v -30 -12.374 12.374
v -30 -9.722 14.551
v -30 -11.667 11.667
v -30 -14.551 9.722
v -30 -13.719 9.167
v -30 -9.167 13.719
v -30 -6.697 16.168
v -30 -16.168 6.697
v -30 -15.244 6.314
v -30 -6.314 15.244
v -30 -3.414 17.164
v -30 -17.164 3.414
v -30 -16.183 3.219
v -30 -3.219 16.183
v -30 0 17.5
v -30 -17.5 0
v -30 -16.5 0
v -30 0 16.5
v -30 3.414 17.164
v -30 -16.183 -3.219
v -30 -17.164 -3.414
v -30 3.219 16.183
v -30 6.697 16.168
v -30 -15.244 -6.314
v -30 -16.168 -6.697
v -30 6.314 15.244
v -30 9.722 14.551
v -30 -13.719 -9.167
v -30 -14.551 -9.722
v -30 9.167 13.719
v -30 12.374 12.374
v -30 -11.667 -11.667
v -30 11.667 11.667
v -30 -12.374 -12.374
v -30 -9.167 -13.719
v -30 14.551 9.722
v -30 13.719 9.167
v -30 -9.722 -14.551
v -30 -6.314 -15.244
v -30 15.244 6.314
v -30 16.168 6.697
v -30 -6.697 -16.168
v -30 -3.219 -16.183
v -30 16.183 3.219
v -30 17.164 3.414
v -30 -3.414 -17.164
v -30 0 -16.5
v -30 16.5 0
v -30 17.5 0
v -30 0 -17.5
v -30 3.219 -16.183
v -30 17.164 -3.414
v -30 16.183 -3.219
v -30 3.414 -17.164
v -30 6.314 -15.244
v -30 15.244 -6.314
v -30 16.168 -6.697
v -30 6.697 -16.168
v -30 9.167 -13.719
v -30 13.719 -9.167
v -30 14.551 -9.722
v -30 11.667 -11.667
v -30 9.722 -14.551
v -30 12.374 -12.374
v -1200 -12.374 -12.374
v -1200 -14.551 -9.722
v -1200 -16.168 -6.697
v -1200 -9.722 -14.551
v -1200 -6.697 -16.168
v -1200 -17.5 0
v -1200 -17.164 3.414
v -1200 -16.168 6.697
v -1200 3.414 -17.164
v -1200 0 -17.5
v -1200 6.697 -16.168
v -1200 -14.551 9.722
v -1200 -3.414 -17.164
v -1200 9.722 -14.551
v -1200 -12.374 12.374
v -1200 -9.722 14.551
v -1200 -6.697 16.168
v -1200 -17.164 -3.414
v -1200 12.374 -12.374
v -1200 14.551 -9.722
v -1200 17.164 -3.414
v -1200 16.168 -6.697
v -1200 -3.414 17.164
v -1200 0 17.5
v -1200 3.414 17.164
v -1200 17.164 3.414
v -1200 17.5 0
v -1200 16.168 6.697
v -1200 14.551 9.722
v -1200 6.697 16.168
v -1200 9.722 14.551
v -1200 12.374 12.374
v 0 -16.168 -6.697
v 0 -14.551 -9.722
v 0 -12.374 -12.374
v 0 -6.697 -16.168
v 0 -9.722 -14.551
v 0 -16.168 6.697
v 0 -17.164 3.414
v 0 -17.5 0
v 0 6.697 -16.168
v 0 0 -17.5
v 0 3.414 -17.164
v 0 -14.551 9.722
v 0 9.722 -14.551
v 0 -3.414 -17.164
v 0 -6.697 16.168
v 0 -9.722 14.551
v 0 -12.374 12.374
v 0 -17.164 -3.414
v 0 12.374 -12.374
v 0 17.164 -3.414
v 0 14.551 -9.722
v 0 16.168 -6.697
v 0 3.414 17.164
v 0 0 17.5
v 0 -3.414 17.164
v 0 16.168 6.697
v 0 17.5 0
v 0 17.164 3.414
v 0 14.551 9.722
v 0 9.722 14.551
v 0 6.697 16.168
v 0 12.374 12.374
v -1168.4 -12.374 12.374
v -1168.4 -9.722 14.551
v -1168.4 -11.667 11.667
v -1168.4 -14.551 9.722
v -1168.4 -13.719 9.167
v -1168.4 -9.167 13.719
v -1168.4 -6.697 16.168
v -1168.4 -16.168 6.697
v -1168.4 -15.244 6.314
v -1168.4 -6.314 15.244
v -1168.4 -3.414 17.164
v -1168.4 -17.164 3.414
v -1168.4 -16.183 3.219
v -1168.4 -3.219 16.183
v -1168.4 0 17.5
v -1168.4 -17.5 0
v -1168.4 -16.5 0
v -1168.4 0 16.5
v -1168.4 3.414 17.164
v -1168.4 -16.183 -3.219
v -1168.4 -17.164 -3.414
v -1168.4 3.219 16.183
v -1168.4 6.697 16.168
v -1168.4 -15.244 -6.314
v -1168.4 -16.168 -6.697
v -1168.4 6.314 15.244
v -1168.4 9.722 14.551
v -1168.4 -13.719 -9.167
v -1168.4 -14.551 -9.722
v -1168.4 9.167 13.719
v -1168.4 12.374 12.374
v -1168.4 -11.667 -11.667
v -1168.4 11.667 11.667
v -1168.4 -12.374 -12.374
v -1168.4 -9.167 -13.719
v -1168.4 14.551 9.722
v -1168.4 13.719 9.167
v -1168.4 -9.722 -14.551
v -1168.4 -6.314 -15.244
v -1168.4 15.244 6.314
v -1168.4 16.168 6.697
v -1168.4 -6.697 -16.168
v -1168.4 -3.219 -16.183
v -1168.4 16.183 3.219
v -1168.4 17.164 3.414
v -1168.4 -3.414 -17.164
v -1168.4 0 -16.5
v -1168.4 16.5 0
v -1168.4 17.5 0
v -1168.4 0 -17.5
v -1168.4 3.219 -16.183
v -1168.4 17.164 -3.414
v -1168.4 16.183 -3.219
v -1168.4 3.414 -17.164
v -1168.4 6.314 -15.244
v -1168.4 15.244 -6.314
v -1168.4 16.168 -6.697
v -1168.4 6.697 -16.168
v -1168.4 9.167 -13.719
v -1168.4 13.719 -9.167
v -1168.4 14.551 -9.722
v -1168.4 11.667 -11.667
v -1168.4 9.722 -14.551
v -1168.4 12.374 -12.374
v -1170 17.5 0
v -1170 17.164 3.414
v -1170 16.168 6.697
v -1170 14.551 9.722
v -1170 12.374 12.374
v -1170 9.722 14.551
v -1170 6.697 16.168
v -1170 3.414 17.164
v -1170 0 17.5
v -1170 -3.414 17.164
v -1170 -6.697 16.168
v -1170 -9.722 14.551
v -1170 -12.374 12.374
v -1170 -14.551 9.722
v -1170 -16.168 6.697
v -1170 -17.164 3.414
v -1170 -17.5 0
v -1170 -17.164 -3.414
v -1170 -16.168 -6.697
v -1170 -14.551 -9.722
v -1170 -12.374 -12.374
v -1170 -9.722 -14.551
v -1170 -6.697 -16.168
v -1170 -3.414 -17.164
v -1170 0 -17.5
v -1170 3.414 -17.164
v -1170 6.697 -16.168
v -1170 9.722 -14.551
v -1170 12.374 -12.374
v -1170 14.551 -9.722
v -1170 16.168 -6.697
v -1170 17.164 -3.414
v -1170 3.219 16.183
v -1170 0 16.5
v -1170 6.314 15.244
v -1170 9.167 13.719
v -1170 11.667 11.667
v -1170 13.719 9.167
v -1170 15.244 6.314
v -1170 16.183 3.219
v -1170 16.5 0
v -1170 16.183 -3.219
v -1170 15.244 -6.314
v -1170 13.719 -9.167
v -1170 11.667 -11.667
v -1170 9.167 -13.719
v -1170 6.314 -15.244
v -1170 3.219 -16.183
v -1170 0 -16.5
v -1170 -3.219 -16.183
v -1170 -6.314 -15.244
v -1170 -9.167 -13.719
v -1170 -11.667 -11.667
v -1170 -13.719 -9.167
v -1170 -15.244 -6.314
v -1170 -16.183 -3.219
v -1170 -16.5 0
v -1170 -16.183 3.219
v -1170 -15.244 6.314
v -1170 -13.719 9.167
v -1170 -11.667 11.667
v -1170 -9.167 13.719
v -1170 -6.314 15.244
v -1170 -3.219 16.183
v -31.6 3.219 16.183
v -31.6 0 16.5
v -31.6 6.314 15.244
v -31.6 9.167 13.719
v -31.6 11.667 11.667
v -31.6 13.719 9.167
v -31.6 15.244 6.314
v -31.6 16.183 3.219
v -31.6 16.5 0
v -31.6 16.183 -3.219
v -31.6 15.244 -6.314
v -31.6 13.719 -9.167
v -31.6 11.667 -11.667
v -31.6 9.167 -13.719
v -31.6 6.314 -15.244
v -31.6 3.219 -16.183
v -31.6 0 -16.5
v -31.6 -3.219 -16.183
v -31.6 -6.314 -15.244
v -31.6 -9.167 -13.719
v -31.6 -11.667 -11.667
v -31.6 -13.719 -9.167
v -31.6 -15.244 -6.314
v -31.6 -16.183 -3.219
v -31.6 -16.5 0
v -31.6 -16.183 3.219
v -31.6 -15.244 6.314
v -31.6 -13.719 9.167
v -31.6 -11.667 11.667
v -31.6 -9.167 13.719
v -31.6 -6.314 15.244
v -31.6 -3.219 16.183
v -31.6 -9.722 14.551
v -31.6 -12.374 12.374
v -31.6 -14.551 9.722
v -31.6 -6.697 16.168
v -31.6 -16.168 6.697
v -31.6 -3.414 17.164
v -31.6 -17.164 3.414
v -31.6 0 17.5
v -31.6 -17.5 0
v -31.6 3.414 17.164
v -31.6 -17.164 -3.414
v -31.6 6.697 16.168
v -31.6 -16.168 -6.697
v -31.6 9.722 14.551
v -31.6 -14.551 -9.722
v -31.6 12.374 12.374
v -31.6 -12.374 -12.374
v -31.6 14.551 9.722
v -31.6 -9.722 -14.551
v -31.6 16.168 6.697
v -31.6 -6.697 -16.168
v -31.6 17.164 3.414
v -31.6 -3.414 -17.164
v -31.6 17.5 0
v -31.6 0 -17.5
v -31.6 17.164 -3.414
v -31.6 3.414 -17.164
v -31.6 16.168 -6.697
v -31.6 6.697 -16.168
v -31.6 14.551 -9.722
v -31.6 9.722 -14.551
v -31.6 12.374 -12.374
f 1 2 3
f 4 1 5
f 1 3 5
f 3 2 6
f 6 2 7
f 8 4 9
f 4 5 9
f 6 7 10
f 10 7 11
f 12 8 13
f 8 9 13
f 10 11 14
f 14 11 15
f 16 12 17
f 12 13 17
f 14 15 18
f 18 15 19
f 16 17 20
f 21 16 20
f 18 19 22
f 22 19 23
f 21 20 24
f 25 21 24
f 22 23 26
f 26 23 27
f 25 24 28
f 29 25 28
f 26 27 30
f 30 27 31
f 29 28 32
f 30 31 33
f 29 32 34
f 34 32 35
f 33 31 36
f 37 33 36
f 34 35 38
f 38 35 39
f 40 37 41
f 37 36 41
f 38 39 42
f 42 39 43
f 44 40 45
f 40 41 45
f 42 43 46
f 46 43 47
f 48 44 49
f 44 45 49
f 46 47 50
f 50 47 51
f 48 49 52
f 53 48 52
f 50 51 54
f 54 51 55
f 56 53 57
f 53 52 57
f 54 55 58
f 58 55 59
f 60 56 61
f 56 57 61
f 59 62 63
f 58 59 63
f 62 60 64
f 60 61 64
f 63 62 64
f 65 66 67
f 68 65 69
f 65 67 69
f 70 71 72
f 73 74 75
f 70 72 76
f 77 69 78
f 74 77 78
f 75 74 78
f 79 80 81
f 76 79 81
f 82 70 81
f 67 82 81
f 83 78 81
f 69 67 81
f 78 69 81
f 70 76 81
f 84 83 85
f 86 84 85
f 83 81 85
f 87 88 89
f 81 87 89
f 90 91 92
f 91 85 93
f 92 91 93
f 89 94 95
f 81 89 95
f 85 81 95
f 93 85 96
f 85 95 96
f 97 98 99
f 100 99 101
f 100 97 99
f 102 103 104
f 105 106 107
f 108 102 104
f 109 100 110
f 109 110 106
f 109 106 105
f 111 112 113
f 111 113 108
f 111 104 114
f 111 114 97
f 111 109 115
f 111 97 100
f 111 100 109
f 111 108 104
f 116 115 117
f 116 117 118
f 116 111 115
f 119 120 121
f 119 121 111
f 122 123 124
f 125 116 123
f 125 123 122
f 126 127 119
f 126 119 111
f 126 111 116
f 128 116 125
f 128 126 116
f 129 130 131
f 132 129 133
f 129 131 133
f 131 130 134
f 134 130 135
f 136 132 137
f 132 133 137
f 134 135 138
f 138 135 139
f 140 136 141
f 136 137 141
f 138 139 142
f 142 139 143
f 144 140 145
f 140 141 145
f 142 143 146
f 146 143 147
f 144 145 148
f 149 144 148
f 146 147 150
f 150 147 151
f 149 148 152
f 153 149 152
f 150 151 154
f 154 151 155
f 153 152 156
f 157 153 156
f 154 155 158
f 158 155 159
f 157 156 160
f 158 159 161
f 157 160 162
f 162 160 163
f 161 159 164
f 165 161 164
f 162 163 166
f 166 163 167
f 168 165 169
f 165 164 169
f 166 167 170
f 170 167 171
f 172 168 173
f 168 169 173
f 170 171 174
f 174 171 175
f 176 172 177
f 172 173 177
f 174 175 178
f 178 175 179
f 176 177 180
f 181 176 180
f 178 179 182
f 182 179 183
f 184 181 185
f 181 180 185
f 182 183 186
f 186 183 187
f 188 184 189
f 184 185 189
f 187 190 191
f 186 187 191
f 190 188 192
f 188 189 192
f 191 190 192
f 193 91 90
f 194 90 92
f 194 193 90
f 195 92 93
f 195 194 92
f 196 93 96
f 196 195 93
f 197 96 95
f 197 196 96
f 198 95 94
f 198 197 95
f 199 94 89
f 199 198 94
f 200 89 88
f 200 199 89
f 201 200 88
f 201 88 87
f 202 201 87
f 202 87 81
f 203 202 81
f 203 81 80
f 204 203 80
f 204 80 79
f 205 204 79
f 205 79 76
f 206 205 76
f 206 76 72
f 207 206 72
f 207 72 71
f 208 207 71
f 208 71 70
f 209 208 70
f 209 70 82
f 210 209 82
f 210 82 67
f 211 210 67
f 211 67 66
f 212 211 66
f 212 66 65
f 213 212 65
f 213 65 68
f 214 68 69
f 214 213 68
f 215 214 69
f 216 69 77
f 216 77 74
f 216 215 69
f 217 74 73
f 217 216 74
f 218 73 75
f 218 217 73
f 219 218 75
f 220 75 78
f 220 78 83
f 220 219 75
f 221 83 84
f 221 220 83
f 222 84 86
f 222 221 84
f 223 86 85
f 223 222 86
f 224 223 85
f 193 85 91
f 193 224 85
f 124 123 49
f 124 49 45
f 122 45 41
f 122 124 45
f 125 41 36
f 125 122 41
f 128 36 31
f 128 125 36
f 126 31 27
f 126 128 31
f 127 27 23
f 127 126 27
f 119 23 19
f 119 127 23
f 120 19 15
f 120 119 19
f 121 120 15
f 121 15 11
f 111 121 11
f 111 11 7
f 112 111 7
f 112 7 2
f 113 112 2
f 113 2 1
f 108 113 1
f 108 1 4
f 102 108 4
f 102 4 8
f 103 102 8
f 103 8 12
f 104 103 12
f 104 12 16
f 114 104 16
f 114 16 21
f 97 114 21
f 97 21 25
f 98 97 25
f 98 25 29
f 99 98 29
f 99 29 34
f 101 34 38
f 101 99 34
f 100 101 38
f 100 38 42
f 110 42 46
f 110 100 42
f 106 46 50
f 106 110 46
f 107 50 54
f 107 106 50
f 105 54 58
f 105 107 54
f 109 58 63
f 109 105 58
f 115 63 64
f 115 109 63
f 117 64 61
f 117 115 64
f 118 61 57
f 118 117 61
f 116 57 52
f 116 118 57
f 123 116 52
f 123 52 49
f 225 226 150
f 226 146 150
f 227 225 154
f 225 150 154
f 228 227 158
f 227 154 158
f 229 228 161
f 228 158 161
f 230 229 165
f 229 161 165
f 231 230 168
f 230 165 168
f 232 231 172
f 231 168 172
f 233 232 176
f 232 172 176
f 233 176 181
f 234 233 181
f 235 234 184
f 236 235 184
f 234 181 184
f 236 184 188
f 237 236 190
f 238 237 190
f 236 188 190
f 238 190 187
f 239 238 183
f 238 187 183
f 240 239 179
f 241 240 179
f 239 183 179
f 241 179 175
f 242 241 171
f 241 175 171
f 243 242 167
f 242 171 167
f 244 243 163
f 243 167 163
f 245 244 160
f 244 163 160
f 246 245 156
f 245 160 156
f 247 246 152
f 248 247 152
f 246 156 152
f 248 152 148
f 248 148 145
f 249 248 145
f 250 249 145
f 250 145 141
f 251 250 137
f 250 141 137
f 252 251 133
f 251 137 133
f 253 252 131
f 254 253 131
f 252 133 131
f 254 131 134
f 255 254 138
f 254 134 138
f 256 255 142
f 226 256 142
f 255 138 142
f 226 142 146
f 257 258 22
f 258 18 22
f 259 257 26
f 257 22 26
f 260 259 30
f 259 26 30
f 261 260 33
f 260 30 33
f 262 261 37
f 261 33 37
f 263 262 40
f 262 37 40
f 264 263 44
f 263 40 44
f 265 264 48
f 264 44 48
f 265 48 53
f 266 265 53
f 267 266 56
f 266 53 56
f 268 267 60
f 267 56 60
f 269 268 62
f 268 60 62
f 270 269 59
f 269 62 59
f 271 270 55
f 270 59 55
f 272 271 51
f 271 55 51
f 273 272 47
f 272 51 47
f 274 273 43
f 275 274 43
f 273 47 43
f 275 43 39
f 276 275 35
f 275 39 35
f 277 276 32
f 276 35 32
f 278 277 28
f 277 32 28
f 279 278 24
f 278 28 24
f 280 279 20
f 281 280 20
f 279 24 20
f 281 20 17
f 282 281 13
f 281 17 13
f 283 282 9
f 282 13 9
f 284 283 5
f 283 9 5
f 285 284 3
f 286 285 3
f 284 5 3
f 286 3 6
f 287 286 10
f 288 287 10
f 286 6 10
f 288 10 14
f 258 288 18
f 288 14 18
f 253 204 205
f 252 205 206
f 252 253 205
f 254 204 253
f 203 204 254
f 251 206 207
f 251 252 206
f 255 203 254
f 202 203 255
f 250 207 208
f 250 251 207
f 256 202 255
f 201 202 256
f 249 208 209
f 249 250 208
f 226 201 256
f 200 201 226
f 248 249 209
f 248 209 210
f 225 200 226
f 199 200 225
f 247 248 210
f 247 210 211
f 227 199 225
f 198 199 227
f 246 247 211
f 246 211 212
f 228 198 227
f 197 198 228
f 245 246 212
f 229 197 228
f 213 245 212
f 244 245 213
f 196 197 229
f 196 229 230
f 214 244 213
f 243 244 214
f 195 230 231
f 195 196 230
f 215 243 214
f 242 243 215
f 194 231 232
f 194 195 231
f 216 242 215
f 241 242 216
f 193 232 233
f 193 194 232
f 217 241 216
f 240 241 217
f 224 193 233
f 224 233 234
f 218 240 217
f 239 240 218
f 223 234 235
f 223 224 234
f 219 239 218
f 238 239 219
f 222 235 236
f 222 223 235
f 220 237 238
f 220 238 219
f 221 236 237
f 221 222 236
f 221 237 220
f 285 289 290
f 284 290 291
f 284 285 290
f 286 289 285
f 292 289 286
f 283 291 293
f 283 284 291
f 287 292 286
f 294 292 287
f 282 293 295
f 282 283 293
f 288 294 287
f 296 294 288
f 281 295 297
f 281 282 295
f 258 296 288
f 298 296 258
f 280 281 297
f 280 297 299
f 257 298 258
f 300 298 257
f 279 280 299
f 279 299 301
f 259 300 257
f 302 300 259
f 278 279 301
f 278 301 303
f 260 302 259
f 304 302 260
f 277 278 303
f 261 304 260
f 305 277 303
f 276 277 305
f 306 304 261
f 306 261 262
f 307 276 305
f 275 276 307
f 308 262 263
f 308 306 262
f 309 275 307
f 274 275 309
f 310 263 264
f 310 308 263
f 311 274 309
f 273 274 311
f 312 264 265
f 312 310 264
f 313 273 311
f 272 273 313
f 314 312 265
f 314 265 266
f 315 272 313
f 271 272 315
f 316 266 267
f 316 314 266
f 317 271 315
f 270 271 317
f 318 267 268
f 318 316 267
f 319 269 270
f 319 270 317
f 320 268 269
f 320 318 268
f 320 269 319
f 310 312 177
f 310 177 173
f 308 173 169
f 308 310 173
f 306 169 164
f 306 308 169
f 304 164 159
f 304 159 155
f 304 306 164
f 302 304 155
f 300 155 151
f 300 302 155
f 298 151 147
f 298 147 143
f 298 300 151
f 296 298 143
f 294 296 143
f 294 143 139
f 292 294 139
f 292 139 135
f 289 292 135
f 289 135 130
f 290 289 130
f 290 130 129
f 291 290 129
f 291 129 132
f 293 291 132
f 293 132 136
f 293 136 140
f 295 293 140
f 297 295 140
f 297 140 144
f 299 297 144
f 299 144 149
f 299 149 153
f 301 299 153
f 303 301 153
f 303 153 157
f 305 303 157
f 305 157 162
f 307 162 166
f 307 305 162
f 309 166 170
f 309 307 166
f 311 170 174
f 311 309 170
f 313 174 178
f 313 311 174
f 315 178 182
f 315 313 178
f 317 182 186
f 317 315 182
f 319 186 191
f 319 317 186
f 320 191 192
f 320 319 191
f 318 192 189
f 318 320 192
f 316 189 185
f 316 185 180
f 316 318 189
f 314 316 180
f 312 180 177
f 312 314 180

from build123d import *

# Parameters (mm, degrees)
F0_R     = 17.5
F1_DEPTH = 1200
F2_W     = 1.6
F2_H     = 1


with BuildPart() as f1:
    # F0 (on Right) → F1 (new body)
    with BuildSketch(Plane.YZ):
        Circle(F0_R)
    extrude(amount=-F1_DEPTH)

    # F2 (on Front) → F3 (revolve, cut)
    with BuildSketch(Plane.XZ):
        with Locations((-30.8, 17)):
            Rectangle(F2_W, F2_H)
        with Locations((-1169.2, 17)):
            Rectangle(F2_W, F2_H)
    revolve(axis=Axis((-600, 0, 0), (-1, 0, 0)), mode=Mode.SUBTRACT)


solid = f1.part
